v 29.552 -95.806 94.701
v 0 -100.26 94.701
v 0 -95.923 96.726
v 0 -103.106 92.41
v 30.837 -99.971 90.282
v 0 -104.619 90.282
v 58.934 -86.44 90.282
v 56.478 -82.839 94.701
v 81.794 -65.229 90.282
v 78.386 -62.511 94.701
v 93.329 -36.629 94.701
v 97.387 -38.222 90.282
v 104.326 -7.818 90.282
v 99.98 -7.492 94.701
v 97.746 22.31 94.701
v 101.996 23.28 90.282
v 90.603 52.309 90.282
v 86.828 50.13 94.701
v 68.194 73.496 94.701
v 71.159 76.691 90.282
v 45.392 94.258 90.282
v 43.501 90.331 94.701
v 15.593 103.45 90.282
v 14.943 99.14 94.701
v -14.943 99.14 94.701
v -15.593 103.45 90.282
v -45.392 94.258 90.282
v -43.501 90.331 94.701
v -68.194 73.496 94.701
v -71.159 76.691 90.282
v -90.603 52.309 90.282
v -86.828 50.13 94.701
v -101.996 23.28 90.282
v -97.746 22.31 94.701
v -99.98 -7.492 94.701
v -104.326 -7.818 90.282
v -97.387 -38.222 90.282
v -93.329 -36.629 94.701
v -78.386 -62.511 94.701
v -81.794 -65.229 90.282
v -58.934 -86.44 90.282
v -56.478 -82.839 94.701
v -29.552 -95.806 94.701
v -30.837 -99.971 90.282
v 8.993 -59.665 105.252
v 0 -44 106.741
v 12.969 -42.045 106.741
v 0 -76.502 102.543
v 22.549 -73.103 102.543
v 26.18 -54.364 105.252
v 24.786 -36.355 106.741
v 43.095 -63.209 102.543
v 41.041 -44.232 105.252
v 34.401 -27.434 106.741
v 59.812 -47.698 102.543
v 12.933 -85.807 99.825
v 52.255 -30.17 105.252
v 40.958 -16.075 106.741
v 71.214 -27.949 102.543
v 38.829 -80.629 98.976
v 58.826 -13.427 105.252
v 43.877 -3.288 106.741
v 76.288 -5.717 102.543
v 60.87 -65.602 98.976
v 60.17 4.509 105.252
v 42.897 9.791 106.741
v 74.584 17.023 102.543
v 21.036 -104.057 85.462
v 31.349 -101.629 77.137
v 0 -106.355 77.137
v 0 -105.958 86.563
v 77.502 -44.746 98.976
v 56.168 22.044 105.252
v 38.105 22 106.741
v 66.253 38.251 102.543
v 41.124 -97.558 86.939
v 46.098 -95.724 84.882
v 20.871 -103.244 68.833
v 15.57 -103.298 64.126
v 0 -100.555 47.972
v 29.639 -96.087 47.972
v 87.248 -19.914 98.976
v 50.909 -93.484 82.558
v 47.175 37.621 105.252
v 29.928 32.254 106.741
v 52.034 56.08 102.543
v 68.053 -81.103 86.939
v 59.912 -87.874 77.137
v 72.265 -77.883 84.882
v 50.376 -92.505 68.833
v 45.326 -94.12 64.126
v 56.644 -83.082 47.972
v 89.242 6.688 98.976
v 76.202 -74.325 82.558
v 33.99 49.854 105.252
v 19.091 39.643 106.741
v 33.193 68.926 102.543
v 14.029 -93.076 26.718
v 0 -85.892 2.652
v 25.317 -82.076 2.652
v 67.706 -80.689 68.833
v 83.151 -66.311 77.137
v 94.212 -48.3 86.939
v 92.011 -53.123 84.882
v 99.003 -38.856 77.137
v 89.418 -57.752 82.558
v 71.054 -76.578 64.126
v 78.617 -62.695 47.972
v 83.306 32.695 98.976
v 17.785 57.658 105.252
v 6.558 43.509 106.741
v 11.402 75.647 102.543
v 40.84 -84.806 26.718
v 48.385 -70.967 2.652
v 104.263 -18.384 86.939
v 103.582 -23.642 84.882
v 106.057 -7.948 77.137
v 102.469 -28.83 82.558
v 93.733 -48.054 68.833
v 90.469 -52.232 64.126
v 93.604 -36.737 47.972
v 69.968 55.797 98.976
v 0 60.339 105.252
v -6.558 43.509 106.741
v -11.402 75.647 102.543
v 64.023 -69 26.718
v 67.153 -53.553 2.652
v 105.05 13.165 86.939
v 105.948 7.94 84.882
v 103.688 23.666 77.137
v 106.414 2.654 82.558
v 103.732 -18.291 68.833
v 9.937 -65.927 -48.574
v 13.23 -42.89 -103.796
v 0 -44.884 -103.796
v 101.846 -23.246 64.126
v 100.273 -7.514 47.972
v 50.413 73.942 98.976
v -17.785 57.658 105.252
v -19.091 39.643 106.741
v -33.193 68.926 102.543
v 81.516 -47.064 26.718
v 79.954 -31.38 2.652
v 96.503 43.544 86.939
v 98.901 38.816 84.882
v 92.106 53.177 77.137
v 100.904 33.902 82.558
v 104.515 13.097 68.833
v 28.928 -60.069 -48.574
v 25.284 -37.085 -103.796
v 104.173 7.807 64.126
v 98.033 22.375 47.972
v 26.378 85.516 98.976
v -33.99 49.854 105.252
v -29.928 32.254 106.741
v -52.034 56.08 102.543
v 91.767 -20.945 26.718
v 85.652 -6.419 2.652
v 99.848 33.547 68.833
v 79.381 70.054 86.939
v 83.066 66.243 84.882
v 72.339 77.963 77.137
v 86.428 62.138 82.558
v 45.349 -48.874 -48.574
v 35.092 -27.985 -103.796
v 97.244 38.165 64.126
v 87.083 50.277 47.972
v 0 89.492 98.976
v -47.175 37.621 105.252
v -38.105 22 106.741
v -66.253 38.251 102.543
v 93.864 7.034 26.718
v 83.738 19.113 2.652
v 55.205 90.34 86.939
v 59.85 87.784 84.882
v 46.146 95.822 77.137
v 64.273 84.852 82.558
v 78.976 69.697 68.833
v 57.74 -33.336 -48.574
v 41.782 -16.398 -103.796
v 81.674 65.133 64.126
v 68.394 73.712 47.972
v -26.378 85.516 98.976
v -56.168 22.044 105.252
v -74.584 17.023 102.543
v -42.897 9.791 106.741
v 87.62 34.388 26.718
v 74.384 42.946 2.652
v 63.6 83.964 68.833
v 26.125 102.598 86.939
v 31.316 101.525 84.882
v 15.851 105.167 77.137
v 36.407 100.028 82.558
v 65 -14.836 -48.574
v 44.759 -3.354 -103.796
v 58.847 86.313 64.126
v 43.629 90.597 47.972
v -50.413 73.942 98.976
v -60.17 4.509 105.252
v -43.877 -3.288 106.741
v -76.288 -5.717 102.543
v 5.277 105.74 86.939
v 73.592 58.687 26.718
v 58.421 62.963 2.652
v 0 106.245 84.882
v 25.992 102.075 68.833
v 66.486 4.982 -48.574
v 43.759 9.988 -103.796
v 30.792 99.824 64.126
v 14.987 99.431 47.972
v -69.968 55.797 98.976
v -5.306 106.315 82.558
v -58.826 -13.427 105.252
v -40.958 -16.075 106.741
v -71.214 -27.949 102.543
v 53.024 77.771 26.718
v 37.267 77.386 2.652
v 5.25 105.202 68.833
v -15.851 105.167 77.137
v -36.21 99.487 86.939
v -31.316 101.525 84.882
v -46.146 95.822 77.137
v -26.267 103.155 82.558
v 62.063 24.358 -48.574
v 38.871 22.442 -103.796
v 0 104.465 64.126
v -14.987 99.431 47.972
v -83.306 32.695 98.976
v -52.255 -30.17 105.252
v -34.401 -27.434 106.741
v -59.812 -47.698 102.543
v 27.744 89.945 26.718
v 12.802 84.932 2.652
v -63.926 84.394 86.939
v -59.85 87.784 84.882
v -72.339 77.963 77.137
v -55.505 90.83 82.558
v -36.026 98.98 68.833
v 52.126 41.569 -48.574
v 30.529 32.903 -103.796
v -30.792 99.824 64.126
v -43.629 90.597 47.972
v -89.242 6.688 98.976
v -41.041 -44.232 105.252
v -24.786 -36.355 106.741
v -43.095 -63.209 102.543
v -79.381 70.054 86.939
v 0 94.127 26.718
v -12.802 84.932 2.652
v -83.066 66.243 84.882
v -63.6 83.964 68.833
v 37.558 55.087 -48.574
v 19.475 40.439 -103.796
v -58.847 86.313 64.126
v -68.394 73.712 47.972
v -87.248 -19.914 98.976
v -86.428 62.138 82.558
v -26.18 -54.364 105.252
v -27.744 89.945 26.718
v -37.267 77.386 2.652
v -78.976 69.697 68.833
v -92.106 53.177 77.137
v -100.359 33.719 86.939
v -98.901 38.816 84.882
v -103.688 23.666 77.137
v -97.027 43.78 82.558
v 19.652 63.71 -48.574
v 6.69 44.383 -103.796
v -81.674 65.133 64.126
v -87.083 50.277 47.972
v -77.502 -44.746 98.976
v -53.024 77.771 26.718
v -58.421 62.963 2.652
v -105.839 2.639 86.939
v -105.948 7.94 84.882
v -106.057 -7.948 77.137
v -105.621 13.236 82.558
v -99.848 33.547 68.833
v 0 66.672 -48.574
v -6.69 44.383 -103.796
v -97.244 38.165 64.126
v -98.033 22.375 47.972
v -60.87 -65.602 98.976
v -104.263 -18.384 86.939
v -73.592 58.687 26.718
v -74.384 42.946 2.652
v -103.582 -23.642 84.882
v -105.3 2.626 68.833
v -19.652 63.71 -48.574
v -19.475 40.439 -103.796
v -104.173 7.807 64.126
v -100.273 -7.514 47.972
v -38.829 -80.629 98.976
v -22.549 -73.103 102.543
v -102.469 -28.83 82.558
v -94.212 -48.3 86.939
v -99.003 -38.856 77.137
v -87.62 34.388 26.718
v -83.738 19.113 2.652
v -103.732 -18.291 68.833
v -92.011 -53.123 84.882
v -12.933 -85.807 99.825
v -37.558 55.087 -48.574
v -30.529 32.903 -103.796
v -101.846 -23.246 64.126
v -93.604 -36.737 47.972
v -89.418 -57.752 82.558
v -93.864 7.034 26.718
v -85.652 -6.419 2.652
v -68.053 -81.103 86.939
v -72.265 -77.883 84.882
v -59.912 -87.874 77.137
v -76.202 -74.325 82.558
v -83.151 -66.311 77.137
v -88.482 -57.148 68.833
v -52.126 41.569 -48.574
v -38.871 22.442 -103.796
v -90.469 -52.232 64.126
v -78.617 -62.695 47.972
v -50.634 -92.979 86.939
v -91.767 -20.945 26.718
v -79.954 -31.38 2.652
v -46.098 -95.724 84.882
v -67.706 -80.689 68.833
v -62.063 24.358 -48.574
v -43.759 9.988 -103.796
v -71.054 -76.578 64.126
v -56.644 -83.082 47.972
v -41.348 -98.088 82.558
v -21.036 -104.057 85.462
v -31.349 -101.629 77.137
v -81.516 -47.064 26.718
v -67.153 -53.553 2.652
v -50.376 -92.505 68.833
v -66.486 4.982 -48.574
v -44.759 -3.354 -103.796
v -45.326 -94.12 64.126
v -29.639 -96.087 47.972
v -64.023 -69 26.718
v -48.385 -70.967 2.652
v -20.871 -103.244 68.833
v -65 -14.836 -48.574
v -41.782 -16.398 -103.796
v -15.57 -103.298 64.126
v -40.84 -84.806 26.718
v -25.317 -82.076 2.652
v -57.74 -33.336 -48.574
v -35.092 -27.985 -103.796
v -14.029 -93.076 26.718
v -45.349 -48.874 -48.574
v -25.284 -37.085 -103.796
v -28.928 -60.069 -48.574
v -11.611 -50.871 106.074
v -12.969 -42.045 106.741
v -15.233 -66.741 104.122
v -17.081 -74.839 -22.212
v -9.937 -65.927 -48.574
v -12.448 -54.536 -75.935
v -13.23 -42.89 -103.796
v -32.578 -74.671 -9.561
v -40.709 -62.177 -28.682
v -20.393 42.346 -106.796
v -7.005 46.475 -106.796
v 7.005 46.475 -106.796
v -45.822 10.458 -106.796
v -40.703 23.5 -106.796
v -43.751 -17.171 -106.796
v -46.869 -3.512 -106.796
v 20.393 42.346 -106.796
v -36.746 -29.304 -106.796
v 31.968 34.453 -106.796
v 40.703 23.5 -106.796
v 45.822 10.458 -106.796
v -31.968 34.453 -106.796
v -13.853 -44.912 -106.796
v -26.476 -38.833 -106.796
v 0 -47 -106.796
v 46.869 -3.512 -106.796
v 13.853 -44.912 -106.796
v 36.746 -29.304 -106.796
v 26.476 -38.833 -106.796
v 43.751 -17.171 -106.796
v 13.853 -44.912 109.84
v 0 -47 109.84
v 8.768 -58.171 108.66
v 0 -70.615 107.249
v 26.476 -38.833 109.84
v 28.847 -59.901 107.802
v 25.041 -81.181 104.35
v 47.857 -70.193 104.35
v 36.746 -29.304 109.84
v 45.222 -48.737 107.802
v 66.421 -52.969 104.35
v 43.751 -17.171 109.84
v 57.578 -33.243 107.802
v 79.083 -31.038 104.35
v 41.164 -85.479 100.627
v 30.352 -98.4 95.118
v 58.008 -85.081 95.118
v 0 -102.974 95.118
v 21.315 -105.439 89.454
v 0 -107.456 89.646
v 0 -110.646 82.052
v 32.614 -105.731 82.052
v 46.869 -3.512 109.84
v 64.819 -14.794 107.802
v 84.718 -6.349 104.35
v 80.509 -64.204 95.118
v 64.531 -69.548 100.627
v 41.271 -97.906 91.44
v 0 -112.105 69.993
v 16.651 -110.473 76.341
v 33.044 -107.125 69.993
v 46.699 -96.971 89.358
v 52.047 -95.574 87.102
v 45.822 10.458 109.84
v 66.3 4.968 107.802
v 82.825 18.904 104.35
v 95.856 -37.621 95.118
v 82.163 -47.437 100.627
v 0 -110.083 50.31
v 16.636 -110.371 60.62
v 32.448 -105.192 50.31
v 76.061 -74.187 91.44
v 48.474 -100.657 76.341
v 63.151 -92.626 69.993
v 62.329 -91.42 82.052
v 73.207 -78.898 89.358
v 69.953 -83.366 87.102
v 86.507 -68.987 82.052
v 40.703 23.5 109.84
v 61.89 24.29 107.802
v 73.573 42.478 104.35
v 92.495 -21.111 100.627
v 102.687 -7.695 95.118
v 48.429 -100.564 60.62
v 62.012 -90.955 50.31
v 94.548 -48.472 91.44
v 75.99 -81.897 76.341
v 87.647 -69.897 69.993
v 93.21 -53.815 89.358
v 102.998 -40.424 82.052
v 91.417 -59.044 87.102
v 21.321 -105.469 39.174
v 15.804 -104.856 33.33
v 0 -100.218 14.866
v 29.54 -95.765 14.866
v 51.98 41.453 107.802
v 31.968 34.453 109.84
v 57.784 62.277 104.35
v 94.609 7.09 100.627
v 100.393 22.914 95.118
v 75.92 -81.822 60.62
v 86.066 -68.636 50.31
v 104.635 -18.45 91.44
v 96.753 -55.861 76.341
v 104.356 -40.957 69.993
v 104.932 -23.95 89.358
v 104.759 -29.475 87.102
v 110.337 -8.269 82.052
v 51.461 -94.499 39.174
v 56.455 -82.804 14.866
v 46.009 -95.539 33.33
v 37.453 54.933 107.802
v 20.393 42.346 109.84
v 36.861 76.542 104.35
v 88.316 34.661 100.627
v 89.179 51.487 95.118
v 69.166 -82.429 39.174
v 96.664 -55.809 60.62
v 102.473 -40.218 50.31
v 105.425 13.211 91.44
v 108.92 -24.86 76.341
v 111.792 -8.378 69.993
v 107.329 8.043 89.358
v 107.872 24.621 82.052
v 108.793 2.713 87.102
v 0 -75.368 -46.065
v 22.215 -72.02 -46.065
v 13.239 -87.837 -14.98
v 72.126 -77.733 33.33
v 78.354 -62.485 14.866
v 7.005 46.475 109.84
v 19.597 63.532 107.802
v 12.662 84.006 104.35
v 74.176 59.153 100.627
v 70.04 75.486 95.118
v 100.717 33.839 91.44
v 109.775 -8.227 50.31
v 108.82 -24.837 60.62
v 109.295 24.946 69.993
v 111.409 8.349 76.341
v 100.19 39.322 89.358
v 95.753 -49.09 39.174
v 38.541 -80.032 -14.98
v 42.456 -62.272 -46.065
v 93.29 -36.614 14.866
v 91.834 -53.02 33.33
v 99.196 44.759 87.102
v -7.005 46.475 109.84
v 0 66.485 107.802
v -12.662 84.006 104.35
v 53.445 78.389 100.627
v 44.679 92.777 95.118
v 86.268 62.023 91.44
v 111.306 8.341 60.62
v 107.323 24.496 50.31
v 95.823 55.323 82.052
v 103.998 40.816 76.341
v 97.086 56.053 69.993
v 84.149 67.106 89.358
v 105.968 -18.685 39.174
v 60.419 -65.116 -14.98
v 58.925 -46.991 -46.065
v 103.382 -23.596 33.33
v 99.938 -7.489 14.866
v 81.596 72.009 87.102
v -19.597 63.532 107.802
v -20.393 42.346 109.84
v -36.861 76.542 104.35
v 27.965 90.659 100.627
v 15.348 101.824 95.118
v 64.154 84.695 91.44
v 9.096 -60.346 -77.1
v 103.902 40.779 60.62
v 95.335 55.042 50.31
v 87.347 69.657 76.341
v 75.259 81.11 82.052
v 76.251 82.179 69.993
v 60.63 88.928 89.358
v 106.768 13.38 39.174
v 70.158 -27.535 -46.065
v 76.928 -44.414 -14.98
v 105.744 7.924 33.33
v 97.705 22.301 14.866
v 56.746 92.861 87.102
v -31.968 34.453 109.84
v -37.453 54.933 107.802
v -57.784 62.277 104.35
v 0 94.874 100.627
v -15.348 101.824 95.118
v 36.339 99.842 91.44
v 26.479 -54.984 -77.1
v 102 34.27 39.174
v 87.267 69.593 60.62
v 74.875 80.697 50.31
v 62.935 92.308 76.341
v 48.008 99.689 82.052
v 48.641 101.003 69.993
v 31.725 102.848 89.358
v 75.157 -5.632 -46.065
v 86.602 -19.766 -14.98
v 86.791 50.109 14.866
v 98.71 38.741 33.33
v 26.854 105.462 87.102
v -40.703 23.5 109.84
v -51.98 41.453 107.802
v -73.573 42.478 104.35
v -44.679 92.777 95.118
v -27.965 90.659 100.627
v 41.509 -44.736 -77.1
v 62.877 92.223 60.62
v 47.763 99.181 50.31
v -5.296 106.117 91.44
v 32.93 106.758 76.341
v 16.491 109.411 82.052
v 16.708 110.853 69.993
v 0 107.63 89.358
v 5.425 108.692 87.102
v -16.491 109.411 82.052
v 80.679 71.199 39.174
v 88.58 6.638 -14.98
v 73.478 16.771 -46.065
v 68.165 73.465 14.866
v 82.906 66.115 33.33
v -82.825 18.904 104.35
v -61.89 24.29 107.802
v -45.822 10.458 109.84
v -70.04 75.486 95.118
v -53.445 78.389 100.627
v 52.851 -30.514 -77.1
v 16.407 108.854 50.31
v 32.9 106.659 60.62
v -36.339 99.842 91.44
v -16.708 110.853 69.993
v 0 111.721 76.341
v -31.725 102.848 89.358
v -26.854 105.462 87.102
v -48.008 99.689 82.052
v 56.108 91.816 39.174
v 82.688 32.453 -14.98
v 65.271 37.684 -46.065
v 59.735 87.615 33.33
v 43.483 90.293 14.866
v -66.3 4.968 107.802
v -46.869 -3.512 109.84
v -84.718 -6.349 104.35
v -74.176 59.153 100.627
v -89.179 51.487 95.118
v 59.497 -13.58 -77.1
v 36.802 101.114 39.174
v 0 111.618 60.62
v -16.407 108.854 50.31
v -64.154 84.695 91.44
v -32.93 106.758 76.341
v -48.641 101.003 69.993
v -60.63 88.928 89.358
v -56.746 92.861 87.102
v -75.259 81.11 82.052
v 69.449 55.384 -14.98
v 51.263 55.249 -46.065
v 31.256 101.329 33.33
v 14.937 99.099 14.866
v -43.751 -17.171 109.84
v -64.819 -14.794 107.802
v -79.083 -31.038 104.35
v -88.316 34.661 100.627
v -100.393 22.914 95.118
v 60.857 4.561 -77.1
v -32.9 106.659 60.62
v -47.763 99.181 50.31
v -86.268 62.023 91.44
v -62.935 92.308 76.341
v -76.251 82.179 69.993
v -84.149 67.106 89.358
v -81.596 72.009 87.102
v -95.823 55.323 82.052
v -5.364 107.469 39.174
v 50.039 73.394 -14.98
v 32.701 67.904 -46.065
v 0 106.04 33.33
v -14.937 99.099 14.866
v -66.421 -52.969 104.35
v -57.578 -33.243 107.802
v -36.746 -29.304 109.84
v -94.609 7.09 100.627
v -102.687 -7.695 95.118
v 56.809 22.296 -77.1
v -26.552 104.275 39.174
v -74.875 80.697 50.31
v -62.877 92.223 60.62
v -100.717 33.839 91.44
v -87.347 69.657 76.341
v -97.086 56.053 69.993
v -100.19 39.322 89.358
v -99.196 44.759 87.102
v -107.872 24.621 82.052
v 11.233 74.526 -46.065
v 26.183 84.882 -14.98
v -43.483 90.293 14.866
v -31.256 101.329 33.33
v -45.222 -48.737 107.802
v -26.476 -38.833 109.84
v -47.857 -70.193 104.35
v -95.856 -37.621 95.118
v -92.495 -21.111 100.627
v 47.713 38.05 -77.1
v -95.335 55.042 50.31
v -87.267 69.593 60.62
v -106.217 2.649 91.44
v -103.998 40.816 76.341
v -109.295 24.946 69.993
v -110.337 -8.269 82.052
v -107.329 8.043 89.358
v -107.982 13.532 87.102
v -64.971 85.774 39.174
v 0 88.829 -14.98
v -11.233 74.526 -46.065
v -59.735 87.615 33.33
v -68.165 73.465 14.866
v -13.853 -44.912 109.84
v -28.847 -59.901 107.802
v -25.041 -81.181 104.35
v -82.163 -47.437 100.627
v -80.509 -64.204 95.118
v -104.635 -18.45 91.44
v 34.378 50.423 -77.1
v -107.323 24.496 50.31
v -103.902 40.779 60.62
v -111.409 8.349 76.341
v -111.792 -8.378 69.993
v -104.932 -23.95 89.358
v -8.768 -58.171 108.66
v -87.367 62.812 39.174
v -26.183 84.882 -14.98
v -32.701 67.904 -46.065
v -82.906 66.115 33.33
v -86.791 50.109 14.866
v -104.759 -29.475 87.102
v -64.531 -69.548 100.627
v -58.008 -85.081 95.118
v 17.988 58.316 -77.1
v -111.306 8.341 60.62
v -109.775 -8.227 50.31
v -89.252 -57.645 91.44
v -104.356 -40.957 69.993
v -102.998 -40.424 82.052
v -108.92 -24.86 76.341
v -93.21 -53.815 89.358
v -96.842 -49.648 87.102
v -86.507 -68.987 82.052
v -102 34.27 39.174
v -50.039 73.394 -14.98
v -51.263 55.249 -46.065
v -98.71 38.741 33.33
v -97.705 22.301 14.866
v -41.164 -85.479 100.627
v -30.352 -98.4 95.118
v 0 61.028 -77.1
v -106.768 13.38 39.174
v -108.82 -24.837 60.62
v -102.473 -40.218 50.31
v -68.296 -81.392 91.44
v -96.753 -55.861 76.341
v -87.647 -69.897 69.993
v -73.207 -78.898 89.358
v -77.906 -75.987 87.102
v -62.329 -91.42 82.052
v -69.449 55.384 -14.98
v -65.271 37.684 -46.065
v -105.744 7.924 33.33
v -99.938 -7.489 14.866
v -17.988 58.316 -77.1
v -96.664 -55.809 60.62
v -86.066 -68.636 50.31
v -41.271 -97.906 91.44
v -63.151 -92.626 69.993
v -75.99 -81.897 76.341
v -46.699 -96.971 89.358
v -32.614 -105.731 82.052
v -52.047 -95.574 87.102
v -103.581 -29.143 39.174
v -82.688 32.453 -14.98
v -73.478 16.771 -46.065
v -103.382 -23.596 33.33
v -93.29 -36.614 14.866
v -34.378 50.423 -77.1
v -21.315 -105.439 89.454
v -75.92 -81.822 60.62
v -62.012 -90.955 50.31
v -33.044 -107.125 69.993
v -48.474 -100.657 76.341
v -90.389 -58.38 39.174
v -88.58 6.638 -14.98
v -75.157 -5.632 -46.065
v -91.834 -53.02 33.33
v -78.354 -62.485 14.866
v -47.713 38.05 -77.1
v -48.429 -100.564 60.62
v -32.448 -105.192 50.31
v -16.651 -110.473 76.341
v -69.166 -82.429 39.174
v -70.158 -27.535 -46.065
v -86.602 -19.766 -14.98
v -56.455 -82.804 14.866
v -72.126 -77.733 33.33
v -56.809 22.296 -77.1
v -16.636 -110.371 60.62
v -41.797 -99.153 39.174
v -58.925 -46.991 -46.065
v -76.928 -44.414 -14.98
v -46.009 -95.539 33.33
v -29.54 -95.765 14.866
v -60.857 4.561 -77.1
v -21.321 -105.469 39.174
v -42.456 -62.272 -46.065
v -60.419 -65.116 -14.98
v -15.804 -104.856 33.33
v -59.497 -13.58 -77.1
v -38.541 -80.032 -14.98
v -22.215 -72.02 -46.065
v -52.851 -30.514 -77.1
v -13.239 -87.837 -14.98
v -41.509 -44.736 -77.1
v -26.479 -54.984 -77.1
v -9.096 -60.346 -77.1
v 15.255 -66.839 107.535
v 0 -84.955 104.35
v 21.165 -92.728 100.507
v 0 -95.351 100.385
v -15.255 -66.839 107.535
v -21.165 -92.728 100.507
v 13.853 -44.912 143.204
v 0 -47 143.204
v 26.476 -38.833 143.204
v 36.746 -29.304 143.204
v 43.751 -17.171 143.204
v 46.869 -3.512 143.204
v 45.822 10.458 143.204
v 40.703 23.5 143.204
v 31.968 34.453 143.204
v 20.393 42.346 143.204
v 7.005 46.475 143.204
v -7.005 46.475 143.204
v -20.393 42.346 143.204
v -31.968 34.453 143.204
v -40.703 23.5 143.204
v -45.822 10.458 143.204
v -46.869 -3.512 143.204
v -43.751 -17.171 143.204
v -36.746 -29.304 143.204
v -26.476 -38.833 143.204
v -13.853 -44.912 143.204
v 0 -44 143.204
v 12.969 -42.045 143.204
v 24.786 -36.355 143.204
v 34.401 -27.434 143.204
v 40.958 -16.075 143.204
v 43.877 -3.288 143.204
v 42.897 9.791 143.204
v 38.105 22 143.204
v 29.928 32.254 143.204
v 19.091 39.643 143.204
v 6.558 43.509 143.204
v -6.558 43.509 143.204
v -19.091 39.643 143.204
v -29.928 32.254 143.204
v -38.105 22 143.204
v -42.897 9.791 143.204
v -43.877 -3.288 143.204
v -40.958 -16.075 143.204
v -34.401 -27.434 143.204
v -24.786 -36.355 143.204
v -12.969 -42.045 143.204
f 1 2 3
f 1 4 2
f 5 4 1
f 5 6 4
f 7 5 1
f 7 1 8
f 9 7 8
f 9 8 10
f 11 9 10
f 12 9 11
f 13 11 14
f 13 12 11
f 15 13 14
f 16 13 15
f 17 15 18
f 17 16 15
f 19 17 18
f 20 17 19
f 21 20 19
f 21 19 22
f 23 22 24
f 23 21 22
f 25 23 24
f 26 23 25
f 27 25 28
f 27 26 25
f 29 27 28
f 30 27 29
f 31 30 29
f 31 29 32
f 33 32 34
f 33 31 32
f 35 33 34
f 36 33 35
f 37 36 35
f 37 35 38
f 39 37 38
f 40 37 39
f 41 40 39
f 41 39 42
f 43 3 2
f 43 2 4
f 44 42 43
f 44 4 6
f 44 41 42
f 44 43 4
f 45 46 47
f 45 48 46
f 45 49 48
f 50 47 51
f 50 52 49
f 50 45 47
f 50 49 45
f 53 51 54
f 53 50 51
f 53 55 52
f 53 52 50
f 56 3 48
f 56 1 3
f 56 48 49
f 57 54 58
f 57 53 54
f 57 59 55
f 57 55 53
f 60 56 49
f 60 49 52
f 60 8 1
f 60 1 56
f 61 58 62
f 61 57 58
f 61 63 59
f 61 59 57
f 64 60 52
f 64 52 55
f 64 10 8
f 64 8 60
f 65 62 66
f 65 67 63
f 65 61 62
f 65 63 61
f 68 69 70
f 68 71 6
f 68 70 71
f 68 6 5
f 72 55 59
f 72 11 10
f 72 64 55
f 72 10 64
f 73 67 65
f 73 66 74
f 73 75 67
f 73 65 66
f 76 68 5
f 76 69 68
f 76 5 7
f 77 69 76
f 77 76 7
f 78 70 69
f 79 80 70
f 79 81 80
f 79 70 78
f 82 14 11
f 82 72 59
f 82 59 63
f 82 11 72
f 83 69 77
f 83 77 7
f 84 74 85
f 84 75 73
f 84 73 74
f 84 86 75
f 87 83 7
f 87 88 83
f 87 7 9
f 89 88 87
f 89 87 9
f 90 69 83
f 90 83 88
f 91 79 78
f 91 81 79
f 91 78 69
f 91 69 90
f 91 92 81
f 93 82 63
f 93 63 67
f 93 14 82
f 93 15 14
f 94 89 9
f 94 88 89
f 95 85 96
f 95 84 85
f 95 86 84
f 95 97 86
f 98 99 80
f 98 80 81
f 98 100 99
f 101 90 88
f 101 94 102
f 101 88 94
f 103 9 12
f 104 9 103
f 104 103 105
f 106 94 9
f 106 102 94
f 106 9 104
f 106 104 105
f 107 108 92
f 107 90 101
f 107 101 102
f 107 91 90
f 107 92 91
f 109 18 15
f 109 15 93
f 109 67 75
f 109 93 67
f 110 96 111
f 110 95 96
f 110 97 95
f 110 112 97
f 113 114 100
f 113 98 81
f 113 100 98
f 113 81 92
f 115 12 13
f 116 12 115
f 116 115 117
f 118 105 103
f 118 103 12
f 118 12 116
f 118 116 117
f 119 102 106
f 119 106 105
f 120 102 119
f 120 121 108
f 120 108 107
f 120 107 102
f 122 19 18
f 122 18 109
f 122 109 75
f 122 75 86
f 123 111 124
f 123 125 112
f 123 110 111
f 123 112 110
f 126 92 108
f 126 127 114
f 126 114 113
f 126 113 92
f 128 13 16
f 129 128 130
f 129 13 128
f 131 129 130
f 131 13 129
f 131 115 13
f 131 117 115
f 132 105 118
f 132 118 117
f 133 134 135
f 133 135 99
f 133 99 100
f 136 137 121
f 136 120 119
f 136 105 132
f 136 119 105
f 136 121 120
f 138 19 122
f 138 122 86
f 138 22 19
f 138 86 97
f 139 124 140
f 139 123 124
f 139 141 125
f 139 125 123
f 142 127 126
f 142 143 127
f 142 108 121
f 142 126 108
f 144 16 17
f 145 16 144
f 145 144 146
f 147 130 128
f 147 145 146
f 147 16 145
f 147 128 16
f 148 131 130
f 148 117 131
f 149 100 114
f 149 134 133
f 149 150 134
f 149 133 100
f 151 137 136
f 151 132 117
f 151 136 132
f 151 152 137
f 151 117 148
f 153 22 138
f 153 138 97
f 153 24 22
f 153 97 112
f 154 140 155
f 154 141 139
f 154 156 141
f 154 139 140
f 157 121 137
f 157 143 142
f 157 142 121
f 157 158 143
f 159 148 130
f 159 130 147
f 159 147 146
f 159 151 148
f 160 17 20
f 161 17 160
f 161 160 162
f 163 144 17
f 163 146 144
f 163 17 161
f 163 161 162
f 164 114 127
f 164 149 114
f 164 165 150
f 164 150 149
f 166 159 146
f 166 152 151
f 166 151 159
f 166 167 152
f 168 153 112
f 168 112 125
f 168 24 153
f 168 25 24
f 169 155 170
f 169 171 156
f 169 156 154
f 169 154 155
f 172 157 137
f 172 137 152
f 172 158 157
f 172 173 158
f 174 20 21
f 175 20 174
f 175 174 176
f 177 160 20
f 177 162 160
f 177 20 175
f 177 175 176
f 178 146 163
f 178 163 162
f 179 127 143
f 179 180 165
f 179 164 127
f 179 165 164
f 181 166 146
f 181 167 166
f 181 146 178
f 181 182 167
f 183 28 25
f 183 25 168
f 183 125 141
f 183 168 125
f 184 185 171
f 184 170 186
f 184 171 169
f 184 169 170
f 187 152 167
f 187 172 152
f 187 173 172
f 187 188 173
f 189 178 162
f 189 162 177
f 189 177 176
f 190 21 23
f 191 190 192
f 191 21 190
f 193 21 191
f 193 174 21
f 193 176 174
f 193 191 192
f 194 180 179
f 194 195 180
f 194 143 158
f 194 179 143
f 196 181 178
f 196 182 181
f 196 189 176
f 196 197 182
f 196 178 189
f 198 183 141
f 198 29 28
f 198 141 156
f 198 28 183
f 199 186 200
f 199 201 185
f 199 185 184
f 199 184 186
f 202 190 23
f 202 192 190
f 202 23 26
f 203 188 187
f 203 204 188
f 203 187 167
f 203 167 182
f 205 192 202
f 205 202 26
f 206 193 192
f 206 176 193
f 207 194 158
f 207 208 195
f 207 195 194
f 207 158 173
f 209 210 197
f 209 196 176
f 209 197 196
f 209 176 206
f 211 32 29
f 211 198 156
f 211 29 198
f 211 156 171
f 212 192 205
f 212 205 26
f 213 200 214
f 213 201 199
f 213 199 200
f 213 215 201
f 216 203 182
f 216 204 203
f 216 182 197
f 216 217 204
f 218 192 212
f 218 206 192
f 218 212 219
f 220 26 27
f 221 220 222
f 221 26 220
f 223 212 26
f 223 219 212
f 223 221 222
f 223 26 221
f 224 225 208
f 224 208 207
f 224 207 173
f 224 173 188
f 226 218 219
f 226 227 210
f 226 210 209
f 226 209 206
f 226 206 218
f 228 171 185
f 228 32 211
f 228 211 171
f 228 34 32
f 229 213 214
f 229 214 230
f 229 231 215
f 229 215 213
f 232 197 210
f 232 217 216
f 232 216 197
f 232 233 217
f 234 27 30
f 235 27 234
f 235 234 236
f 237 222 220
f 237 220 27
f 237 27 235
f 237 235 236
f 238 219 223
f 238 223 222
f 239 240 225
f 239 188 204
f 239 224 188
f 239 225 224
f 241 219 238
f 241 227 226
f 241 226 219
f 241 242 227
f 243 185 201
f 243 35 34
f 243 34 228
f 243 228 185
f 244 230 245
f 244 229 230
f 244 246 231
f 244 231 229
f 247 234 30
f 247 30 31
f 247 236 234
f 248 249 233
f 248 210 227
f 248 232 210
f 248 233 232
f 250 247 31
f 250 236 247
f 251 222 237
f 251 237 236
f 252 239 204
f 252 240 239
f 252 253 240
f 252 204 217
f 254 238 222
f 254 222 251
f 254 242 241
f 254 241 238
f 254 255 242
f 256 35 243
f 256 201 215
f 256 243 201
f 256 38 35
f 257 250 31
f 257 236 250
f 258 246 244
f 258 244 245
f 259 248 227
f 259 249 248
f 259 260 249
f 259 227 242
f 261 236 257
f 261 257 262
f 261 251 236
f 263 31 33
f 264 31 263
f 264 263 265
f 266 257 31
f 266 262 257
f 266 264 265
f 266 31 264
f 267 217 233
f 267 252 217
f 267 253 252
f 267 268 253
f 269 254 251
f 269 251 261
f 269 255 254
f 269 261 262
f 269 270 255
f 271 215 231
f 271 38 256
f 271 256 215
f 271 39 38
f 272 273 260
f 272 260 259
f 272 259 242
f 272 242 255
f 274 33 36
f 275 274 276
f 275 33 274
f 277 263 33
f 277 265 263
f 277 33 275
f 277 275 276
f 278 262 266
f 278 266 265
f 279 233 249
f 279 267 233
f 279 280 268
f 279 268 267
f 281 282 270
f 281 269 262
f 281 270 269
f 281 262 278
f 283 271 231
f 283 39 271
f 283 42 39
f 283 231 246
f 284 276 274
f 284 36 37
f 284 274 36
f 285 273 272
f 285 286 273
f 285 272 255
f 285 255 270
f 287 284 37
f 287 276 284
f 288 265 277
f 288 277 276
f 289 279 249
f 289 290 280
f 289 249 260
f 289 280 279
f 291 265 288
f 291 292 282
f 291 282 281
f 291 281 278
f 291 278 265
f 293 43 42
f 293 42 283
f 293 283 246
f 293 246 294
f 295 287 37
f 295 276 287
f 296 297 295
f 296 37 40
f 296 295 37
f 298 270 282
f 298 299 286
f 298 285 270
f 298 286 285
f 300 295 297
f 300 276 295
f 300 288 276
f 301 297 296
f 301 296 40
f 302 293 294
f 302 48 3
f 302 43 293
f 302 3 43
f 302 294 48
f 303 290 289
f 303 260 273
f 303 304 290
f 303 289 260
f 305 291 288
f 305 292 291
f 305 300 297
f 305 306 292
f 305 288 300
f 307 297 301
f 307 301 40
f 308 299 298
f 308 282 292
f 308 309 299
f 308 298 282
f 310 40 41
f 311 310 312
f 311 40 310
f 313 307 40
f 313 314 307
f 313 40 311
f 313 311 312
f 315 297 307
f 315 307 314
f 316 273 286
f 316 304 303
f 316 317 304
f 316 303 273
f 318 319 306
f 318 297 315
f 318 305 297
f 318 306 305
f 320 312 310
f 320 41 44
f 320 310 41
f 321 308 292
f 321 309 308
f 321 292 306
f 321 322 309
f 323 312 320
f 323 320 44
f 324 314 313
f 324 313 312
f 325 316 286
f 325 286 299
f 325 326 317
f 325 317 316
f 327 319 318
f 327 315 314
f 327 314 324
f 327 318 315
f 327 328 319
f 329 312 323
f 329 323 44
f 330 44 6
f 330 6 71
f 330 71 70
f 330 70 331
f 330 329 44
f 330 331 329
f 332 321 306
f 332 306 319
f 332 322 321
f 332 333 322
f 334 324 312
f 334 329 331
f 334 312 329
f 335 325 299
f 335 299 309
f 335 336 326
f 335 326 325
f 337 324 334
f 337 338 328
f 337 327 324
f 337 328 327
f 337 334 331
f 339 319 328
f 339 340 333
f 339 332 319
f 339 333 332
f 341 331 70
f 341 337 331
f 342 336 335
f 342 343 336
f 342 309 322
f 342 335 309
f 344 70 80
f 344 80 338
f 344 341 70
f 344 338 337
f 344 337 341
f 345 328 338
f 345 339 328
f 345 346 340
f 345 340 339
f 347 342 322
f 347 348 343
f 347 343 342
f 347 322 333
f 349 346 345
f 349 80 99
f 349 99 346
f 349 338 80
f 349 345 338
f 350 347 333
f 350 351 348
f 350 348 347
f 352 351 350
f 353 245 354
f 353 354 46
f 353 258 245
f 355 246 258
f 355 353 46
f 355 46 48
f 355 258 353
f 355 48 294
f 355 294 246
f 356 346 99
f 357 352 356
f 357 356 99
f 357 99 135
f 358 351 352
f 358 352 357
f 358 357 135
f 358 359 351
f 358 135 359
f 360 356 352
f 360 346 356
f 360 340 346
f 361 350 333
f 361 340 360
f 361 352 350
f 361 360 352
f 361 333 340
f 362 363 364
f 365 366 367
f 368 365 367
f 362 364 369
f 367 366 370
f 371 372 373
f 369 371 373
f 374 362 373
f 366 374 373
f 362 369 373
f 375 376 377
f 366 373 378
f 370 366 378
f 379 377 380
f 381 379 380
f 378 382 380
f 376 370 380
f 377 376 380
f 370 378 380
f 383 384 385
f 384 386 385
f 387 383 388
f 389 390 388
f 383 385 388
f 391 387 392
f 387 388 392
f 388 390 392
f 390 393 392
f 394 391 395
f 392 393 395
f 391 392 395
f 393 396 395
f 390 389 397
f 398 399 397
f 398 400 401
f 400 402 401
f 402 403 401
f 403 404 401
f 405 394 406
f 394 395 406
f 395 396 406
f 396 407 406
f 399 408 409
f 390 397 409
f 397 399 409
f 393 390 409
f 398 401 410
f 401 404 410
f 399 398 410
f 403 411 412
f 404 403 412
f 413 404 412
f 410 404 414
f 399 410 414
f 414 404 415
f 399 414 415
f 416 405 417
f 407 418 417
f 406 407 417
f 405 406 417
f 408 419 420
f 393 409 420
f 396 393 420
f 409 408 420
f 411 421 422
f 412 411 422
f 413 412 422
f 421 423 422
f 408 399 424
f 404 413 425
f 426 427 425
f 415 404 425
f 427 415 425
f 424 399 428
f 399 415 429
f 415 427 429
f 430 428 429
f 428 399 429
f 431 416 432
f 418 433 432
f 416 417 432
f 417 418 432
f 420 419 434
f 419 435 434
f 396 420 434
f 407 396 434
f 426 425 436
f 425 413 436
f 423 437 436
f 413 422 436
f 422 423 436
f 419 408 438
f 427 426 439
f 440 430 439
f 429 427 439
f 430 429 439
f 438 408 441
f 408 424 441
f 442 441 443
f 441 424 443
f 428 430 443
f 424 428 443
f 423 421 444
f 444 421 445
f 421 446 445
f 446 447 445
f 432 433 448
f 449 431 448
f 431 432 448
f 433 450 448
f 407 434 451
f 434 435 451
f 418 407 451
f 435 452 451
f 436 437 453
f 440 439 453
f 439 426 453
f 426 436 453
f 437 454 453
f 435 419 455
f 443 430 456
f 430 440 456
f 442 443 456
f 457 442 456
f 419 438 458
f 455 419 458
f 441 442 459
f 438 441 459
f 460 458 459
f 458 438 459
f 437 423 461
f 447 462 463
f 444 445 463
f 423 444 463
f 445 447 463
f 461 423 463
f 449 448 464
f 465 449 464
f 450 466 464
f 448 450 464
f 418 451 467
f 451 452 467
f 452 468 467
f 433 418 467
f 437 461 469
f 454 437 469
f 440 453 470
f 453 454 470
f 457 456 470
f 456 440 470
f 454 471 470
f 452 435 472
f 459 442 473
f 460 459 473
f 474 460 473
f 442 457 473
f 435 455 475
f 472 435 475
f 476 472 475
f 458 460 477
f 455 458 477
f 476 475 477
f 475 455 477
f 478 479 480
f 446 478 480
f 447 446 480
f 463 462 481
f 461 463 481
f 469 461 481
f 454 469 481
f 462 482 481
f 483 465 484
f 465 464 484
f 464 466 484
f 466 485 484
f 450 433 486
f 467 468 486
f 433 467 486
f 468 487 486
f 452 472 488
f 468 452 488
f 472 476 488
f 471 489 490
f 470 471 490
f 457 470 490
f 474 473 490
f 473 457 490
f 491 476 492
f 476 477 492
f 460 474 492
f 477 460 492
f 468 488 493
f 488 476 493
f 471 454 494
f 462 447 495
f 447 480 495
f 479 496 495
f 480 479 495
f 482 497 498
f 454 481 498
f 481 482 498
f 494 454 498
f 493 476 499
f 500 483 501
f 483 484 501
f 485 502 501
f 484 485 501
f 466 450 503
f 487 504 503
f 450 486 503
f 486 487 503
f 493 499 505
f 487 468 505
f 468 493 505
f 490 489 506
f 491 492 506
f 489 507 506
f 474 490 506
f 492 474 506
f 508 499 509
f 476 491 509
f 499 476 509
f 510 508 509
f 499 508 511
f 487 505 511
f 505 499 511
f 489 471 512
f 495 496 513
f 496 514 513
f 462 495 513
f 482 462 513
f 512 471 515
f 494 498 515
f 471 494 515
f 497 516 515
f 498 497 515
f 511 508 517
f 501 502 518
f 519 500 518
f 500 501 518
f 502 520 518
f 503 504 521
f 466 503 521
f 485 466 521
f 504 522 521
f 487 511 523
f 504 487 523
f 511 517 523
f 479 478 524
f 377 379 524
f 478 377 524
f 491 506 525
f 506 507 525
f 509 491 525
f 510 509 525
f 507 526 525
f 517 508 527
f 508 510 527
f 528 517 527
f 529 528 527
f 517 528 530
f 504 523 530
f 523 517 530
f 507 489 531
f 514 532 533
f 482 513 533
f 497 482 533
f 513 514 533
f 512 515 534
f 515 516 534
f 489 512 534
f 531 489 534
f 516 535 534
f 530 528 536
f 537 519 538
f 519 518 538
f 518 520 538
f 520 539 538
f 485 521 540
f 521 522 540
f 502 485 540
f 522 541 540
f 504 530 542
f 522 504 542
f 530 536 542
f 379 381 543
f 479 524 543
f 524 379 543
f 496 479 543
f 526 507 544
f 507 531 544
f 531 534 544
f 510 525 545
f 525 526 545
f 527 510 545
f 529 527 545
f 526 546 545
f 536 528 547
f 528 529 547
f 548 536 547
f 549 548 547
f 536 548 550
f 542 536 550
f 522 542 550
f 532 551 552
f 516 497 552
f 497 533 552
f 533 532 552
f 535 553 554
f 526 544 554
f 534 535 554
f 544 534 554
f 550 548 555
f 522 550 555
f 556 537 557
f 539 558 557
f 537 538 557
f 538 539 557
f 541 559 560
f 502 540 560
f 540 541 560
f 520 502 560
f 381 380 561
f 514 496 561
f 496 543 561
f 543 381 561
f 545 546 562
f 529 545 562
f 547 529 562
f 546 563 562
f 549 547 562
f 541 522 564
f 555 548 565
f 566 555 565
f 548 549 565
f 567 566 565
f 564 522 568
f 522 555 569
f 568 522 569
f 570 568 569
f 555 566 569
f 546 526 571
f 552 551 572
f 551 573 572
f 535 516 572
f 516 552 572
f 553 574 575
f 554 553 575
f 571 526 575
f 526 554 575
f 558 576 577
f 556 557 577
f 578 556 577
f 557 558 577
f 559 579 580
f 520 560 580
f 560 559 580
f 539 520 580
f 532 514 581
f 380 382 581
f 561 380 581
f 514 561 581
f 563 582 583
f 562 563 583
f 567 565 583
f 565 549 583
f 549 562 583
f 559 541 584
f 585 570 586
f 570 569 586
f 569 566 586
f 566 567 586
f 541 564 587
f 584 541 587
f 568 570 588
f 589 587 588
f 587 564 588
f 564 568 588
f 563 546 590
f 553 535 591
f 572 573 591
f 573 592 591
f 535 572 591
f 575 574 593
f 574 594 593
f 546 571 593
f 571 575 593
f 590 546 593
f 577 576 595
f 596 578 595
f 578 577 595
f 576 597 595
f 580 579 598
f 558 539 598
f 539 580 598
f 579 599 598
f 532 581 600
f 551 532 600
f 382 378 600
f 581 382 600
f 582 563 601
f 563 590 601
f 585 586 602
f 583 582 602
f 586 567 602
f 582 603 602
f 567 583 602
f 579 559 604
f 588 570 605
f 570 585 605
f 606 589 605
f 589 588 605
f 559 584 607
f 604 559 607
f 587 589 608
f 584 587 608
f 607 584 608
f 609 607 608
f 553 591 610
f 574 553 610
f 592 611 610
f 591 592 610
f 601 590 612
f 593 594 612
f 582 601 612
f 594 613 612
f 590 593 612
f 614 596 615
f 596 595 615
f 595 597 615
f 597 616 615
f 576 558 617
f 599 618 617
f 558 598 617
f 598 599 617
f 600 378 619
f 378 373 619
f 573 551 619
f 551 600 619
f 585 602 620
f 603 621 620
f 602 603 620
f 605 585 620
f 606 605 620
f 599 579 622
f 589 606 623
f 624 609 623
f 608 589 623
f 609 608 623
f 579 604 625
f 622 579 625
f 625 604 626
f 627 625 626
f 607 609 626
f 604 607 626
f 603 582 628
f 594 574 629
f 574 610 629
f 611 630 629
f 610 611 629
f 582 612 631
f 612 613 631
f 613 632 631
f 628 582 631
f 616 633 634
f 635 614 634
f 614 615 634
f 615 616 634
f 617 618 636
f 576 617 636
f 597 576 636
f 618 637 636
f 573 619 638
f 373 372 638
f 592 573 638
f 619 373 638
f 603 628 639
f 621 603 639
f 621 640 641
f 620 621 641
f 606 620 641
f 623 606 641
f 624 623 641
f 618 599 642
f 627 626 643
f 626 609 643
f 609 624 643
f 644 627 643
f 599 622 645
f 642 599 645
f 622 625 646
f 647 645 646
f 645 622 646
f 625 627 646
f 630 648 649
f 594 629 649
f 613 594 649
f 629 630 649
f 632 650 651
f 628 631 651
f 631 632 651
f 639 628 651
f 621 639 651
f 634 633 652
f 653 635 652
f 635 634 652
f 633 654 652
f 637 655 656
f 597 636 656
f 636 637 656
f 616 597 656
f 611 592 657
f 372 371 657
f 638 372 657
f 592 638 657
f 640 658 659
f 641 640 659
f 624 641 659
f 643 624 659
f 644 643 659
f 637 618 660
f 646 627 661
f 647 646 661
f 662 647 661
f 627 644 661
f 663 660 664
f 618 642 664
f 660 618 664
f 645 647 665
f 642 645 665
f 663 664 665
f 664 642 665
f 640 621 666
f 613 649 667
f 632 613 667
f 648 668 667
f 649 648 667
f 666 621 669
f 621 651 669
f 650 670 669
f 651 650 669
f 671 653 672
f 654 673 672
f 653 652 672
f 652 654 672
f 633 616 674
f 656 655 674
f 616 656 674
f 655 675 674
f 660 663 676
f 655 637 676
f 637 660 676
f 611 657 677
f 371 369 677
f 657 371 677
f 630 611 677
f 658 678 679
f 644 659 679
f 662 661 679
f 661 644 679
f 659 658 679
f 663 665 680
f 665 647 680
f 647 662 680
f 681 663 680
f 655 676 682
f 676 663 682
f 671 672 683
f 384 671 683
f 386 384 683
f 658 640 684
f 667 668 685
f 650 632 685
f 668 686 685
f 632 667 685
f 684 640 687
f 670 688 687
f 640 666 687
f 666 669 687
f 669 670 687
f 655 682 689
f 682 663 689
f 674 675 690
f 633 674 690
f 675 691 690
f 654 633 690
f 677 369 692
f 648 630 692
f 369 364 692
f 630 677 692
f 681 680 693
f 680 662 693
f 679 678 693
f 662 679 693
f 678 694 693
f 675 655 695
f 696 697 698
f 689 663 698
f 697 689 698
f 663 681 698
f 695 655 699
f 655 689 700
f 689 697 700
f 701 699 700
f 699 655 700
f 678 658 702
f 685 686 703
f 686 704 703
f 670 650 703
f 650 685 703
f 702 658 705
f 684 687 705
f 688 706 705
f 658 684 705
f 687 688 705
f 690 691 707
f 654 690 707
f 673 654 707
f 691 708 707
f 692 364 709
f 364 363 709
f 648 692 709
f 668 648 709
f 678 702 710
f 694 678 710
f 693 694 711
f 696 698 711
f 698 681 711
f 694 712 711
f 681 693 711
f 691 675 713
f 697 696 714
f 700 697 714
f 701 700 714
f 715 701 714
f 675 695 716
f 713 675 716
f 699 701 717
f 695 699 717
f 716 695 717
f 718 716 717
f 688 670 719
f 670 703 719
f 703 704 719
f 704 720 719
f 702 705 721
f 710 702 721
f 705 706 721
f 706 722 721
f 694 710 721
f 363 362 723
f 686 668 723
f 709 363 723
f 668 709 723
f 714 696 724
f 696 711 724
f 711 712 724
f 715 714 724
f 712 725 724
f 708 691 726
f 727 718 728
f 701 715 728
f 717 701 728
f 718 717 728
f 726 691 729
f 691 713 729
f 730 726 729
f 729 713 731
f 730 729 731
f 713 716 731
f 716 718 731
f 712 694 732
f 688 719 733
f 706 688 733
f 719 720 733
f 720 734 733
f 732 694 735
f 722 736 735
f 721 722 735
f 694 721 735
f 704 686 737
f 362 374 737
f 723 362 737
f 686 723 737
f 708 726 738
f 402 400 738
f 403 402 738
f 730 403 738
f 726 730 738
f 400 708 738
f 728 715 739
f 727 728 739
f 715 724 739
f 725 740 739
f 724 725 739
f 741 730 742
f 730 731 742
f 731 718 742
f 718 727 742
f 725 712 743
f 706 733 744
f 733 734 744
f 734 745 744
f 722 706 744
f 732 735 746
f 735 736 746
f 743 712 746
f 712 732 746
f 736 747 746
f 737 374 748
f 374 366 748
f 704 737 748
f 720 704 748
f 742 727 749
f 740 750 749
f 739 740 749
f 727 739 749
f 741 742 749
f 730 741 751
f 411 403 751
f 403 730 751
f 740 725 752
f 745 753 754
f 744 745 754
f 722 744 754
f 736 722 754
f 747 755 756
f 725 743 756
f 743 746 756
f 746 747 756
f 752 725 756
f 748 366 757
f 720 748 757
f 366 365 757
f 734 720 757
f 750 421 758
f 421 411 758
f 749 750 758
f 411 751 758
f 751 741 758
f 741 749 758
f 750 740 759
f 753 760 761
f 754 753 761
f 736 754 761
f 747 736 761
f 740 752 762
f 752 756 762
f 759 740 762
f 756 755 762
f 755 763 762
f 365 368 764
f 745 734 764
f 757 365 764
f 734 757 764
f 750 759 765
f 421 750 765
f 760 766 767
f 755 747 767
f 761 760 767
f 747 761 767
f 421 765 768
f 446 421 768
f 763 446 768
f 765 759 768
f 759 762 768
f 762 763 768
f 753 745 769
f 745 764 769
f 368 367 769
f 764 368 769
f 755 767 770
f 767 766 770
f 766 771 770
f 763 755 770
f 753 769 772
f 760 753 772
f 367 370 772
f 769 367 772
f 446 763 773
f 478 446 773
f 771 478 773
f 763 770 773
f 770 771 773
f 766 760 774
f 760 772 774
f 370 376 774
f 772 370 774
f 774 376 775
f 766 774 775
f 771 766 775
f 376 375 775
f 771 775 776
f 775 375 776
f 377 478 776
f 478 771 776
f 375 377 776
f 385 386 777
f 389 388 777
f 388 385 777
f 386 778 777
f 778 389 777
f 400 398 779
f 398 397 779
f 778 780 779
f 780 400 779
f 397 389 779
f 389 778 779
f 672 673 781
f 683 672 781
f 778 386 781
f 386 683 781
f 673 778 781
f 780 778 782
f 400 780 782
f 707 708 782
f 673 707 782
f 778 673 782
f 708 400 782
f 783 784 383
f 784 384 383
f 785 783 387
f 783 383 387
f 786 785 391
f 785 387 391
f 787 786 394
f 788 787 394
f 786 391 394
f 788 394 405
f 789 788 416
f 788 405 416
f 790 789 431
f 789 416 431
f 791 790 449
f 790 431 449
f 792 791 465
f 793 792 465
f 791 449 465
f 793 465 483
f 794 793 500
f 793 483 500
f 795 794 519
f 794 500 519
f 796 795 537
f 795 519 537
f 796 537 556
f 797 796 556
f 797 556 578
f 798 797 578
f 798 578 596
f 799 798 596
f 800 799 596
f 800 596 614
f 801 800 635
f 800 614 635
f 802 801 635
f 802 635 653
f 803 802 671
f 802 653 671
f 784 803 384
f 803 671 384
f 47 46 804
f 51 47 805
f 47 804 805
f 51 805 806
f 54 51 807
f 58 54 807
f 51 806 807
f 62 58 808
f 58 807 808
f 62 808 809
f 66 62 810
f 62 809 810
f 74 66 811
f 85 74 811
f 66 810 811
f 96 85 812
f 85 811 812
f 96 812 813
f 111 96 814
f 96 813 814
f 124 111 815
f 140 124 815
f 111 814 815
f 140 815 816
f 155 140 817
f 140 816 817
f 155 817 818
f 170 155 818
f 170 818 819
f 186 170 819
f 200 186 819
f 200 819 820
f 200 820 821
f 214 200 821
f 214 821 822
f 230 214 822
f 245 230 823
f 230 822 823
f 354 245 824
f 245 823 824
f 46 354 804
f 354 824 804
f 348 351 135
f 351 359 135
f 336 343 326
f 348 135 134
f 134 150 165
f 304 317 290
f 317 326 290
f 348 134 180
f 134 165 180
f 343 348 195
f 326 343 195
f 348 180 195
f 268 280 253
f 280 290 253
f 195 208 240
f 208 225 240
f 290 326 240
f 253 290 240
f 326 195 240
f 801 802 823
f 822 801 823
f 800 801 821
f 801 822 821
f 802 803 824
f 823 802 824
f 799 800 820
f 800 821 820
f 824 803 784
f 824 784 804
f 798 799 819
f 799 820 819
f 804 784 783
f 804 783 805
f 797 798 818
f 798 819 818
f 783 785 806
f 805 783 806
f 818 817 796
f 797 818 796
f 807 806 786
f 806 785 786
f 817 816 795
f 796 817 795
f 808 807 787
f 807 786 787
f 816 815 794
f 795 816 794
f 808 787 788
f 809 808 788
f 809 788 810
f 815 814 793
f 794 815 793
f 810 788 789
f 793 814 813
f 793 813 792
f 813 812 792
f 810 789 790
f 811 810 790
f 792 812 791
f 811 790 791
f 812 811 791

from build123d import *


with BuildPart() as f1:
    # F0 (on Right) → F1 (revolve)
    with BuildSketch(Plane.YZ):
        with BuildLine():
            Line((-44, 143.2044637066), (-47, 143.2044637066))
            Line((-47, 143.2044637066), (-47, 109.8402382309))
            add(Edge.make_bspline(
                [(-47, 109.8402382309), (-72.0602910577, 107.2359927364), (-150.0014117026, 104.1949615692), (-79.1856109773, -38.4851433561), (-47, -106.7955362934)],
                knots=[0, 0, 0, 0, 0.3636065333, 1, 1, 1, 1], degree=3))
            Line((-47, -106.7955362934), (0, -106.7955362934))
            Line((0, -106.7955362934), (0, -103.7955362934))
            Line((0, -103.7955362934), (-44.8843128979, -103.7955362934))
            add(Edge.make_bspline(
                [(-44, 106.7406758666), (-53.0841292499, 106.0286649785), (-70.7793075522, 104.6417230634), (-94.6364553857, 97.7229220581), (-120.2893351597, 85.8976557914), (-77.9927322231, -20.5061006791), (-44.8843128979, -103.7955362934)],
                knots=[0, 0, 0, 0, 0.1850179973, 0.3604006902, 0.4993422479, 1, 1, 1, 1], degree=3))
            Line((-44, 106.7406758666), (-44, 109.9028289318))
            Line((-44, 109.9028289318), (-44, 143.2044637066))
        make_face()
    revolve(axis=Axis((0, 0, 41.66650682), (0, 0, 1)))


solid = f1.part
